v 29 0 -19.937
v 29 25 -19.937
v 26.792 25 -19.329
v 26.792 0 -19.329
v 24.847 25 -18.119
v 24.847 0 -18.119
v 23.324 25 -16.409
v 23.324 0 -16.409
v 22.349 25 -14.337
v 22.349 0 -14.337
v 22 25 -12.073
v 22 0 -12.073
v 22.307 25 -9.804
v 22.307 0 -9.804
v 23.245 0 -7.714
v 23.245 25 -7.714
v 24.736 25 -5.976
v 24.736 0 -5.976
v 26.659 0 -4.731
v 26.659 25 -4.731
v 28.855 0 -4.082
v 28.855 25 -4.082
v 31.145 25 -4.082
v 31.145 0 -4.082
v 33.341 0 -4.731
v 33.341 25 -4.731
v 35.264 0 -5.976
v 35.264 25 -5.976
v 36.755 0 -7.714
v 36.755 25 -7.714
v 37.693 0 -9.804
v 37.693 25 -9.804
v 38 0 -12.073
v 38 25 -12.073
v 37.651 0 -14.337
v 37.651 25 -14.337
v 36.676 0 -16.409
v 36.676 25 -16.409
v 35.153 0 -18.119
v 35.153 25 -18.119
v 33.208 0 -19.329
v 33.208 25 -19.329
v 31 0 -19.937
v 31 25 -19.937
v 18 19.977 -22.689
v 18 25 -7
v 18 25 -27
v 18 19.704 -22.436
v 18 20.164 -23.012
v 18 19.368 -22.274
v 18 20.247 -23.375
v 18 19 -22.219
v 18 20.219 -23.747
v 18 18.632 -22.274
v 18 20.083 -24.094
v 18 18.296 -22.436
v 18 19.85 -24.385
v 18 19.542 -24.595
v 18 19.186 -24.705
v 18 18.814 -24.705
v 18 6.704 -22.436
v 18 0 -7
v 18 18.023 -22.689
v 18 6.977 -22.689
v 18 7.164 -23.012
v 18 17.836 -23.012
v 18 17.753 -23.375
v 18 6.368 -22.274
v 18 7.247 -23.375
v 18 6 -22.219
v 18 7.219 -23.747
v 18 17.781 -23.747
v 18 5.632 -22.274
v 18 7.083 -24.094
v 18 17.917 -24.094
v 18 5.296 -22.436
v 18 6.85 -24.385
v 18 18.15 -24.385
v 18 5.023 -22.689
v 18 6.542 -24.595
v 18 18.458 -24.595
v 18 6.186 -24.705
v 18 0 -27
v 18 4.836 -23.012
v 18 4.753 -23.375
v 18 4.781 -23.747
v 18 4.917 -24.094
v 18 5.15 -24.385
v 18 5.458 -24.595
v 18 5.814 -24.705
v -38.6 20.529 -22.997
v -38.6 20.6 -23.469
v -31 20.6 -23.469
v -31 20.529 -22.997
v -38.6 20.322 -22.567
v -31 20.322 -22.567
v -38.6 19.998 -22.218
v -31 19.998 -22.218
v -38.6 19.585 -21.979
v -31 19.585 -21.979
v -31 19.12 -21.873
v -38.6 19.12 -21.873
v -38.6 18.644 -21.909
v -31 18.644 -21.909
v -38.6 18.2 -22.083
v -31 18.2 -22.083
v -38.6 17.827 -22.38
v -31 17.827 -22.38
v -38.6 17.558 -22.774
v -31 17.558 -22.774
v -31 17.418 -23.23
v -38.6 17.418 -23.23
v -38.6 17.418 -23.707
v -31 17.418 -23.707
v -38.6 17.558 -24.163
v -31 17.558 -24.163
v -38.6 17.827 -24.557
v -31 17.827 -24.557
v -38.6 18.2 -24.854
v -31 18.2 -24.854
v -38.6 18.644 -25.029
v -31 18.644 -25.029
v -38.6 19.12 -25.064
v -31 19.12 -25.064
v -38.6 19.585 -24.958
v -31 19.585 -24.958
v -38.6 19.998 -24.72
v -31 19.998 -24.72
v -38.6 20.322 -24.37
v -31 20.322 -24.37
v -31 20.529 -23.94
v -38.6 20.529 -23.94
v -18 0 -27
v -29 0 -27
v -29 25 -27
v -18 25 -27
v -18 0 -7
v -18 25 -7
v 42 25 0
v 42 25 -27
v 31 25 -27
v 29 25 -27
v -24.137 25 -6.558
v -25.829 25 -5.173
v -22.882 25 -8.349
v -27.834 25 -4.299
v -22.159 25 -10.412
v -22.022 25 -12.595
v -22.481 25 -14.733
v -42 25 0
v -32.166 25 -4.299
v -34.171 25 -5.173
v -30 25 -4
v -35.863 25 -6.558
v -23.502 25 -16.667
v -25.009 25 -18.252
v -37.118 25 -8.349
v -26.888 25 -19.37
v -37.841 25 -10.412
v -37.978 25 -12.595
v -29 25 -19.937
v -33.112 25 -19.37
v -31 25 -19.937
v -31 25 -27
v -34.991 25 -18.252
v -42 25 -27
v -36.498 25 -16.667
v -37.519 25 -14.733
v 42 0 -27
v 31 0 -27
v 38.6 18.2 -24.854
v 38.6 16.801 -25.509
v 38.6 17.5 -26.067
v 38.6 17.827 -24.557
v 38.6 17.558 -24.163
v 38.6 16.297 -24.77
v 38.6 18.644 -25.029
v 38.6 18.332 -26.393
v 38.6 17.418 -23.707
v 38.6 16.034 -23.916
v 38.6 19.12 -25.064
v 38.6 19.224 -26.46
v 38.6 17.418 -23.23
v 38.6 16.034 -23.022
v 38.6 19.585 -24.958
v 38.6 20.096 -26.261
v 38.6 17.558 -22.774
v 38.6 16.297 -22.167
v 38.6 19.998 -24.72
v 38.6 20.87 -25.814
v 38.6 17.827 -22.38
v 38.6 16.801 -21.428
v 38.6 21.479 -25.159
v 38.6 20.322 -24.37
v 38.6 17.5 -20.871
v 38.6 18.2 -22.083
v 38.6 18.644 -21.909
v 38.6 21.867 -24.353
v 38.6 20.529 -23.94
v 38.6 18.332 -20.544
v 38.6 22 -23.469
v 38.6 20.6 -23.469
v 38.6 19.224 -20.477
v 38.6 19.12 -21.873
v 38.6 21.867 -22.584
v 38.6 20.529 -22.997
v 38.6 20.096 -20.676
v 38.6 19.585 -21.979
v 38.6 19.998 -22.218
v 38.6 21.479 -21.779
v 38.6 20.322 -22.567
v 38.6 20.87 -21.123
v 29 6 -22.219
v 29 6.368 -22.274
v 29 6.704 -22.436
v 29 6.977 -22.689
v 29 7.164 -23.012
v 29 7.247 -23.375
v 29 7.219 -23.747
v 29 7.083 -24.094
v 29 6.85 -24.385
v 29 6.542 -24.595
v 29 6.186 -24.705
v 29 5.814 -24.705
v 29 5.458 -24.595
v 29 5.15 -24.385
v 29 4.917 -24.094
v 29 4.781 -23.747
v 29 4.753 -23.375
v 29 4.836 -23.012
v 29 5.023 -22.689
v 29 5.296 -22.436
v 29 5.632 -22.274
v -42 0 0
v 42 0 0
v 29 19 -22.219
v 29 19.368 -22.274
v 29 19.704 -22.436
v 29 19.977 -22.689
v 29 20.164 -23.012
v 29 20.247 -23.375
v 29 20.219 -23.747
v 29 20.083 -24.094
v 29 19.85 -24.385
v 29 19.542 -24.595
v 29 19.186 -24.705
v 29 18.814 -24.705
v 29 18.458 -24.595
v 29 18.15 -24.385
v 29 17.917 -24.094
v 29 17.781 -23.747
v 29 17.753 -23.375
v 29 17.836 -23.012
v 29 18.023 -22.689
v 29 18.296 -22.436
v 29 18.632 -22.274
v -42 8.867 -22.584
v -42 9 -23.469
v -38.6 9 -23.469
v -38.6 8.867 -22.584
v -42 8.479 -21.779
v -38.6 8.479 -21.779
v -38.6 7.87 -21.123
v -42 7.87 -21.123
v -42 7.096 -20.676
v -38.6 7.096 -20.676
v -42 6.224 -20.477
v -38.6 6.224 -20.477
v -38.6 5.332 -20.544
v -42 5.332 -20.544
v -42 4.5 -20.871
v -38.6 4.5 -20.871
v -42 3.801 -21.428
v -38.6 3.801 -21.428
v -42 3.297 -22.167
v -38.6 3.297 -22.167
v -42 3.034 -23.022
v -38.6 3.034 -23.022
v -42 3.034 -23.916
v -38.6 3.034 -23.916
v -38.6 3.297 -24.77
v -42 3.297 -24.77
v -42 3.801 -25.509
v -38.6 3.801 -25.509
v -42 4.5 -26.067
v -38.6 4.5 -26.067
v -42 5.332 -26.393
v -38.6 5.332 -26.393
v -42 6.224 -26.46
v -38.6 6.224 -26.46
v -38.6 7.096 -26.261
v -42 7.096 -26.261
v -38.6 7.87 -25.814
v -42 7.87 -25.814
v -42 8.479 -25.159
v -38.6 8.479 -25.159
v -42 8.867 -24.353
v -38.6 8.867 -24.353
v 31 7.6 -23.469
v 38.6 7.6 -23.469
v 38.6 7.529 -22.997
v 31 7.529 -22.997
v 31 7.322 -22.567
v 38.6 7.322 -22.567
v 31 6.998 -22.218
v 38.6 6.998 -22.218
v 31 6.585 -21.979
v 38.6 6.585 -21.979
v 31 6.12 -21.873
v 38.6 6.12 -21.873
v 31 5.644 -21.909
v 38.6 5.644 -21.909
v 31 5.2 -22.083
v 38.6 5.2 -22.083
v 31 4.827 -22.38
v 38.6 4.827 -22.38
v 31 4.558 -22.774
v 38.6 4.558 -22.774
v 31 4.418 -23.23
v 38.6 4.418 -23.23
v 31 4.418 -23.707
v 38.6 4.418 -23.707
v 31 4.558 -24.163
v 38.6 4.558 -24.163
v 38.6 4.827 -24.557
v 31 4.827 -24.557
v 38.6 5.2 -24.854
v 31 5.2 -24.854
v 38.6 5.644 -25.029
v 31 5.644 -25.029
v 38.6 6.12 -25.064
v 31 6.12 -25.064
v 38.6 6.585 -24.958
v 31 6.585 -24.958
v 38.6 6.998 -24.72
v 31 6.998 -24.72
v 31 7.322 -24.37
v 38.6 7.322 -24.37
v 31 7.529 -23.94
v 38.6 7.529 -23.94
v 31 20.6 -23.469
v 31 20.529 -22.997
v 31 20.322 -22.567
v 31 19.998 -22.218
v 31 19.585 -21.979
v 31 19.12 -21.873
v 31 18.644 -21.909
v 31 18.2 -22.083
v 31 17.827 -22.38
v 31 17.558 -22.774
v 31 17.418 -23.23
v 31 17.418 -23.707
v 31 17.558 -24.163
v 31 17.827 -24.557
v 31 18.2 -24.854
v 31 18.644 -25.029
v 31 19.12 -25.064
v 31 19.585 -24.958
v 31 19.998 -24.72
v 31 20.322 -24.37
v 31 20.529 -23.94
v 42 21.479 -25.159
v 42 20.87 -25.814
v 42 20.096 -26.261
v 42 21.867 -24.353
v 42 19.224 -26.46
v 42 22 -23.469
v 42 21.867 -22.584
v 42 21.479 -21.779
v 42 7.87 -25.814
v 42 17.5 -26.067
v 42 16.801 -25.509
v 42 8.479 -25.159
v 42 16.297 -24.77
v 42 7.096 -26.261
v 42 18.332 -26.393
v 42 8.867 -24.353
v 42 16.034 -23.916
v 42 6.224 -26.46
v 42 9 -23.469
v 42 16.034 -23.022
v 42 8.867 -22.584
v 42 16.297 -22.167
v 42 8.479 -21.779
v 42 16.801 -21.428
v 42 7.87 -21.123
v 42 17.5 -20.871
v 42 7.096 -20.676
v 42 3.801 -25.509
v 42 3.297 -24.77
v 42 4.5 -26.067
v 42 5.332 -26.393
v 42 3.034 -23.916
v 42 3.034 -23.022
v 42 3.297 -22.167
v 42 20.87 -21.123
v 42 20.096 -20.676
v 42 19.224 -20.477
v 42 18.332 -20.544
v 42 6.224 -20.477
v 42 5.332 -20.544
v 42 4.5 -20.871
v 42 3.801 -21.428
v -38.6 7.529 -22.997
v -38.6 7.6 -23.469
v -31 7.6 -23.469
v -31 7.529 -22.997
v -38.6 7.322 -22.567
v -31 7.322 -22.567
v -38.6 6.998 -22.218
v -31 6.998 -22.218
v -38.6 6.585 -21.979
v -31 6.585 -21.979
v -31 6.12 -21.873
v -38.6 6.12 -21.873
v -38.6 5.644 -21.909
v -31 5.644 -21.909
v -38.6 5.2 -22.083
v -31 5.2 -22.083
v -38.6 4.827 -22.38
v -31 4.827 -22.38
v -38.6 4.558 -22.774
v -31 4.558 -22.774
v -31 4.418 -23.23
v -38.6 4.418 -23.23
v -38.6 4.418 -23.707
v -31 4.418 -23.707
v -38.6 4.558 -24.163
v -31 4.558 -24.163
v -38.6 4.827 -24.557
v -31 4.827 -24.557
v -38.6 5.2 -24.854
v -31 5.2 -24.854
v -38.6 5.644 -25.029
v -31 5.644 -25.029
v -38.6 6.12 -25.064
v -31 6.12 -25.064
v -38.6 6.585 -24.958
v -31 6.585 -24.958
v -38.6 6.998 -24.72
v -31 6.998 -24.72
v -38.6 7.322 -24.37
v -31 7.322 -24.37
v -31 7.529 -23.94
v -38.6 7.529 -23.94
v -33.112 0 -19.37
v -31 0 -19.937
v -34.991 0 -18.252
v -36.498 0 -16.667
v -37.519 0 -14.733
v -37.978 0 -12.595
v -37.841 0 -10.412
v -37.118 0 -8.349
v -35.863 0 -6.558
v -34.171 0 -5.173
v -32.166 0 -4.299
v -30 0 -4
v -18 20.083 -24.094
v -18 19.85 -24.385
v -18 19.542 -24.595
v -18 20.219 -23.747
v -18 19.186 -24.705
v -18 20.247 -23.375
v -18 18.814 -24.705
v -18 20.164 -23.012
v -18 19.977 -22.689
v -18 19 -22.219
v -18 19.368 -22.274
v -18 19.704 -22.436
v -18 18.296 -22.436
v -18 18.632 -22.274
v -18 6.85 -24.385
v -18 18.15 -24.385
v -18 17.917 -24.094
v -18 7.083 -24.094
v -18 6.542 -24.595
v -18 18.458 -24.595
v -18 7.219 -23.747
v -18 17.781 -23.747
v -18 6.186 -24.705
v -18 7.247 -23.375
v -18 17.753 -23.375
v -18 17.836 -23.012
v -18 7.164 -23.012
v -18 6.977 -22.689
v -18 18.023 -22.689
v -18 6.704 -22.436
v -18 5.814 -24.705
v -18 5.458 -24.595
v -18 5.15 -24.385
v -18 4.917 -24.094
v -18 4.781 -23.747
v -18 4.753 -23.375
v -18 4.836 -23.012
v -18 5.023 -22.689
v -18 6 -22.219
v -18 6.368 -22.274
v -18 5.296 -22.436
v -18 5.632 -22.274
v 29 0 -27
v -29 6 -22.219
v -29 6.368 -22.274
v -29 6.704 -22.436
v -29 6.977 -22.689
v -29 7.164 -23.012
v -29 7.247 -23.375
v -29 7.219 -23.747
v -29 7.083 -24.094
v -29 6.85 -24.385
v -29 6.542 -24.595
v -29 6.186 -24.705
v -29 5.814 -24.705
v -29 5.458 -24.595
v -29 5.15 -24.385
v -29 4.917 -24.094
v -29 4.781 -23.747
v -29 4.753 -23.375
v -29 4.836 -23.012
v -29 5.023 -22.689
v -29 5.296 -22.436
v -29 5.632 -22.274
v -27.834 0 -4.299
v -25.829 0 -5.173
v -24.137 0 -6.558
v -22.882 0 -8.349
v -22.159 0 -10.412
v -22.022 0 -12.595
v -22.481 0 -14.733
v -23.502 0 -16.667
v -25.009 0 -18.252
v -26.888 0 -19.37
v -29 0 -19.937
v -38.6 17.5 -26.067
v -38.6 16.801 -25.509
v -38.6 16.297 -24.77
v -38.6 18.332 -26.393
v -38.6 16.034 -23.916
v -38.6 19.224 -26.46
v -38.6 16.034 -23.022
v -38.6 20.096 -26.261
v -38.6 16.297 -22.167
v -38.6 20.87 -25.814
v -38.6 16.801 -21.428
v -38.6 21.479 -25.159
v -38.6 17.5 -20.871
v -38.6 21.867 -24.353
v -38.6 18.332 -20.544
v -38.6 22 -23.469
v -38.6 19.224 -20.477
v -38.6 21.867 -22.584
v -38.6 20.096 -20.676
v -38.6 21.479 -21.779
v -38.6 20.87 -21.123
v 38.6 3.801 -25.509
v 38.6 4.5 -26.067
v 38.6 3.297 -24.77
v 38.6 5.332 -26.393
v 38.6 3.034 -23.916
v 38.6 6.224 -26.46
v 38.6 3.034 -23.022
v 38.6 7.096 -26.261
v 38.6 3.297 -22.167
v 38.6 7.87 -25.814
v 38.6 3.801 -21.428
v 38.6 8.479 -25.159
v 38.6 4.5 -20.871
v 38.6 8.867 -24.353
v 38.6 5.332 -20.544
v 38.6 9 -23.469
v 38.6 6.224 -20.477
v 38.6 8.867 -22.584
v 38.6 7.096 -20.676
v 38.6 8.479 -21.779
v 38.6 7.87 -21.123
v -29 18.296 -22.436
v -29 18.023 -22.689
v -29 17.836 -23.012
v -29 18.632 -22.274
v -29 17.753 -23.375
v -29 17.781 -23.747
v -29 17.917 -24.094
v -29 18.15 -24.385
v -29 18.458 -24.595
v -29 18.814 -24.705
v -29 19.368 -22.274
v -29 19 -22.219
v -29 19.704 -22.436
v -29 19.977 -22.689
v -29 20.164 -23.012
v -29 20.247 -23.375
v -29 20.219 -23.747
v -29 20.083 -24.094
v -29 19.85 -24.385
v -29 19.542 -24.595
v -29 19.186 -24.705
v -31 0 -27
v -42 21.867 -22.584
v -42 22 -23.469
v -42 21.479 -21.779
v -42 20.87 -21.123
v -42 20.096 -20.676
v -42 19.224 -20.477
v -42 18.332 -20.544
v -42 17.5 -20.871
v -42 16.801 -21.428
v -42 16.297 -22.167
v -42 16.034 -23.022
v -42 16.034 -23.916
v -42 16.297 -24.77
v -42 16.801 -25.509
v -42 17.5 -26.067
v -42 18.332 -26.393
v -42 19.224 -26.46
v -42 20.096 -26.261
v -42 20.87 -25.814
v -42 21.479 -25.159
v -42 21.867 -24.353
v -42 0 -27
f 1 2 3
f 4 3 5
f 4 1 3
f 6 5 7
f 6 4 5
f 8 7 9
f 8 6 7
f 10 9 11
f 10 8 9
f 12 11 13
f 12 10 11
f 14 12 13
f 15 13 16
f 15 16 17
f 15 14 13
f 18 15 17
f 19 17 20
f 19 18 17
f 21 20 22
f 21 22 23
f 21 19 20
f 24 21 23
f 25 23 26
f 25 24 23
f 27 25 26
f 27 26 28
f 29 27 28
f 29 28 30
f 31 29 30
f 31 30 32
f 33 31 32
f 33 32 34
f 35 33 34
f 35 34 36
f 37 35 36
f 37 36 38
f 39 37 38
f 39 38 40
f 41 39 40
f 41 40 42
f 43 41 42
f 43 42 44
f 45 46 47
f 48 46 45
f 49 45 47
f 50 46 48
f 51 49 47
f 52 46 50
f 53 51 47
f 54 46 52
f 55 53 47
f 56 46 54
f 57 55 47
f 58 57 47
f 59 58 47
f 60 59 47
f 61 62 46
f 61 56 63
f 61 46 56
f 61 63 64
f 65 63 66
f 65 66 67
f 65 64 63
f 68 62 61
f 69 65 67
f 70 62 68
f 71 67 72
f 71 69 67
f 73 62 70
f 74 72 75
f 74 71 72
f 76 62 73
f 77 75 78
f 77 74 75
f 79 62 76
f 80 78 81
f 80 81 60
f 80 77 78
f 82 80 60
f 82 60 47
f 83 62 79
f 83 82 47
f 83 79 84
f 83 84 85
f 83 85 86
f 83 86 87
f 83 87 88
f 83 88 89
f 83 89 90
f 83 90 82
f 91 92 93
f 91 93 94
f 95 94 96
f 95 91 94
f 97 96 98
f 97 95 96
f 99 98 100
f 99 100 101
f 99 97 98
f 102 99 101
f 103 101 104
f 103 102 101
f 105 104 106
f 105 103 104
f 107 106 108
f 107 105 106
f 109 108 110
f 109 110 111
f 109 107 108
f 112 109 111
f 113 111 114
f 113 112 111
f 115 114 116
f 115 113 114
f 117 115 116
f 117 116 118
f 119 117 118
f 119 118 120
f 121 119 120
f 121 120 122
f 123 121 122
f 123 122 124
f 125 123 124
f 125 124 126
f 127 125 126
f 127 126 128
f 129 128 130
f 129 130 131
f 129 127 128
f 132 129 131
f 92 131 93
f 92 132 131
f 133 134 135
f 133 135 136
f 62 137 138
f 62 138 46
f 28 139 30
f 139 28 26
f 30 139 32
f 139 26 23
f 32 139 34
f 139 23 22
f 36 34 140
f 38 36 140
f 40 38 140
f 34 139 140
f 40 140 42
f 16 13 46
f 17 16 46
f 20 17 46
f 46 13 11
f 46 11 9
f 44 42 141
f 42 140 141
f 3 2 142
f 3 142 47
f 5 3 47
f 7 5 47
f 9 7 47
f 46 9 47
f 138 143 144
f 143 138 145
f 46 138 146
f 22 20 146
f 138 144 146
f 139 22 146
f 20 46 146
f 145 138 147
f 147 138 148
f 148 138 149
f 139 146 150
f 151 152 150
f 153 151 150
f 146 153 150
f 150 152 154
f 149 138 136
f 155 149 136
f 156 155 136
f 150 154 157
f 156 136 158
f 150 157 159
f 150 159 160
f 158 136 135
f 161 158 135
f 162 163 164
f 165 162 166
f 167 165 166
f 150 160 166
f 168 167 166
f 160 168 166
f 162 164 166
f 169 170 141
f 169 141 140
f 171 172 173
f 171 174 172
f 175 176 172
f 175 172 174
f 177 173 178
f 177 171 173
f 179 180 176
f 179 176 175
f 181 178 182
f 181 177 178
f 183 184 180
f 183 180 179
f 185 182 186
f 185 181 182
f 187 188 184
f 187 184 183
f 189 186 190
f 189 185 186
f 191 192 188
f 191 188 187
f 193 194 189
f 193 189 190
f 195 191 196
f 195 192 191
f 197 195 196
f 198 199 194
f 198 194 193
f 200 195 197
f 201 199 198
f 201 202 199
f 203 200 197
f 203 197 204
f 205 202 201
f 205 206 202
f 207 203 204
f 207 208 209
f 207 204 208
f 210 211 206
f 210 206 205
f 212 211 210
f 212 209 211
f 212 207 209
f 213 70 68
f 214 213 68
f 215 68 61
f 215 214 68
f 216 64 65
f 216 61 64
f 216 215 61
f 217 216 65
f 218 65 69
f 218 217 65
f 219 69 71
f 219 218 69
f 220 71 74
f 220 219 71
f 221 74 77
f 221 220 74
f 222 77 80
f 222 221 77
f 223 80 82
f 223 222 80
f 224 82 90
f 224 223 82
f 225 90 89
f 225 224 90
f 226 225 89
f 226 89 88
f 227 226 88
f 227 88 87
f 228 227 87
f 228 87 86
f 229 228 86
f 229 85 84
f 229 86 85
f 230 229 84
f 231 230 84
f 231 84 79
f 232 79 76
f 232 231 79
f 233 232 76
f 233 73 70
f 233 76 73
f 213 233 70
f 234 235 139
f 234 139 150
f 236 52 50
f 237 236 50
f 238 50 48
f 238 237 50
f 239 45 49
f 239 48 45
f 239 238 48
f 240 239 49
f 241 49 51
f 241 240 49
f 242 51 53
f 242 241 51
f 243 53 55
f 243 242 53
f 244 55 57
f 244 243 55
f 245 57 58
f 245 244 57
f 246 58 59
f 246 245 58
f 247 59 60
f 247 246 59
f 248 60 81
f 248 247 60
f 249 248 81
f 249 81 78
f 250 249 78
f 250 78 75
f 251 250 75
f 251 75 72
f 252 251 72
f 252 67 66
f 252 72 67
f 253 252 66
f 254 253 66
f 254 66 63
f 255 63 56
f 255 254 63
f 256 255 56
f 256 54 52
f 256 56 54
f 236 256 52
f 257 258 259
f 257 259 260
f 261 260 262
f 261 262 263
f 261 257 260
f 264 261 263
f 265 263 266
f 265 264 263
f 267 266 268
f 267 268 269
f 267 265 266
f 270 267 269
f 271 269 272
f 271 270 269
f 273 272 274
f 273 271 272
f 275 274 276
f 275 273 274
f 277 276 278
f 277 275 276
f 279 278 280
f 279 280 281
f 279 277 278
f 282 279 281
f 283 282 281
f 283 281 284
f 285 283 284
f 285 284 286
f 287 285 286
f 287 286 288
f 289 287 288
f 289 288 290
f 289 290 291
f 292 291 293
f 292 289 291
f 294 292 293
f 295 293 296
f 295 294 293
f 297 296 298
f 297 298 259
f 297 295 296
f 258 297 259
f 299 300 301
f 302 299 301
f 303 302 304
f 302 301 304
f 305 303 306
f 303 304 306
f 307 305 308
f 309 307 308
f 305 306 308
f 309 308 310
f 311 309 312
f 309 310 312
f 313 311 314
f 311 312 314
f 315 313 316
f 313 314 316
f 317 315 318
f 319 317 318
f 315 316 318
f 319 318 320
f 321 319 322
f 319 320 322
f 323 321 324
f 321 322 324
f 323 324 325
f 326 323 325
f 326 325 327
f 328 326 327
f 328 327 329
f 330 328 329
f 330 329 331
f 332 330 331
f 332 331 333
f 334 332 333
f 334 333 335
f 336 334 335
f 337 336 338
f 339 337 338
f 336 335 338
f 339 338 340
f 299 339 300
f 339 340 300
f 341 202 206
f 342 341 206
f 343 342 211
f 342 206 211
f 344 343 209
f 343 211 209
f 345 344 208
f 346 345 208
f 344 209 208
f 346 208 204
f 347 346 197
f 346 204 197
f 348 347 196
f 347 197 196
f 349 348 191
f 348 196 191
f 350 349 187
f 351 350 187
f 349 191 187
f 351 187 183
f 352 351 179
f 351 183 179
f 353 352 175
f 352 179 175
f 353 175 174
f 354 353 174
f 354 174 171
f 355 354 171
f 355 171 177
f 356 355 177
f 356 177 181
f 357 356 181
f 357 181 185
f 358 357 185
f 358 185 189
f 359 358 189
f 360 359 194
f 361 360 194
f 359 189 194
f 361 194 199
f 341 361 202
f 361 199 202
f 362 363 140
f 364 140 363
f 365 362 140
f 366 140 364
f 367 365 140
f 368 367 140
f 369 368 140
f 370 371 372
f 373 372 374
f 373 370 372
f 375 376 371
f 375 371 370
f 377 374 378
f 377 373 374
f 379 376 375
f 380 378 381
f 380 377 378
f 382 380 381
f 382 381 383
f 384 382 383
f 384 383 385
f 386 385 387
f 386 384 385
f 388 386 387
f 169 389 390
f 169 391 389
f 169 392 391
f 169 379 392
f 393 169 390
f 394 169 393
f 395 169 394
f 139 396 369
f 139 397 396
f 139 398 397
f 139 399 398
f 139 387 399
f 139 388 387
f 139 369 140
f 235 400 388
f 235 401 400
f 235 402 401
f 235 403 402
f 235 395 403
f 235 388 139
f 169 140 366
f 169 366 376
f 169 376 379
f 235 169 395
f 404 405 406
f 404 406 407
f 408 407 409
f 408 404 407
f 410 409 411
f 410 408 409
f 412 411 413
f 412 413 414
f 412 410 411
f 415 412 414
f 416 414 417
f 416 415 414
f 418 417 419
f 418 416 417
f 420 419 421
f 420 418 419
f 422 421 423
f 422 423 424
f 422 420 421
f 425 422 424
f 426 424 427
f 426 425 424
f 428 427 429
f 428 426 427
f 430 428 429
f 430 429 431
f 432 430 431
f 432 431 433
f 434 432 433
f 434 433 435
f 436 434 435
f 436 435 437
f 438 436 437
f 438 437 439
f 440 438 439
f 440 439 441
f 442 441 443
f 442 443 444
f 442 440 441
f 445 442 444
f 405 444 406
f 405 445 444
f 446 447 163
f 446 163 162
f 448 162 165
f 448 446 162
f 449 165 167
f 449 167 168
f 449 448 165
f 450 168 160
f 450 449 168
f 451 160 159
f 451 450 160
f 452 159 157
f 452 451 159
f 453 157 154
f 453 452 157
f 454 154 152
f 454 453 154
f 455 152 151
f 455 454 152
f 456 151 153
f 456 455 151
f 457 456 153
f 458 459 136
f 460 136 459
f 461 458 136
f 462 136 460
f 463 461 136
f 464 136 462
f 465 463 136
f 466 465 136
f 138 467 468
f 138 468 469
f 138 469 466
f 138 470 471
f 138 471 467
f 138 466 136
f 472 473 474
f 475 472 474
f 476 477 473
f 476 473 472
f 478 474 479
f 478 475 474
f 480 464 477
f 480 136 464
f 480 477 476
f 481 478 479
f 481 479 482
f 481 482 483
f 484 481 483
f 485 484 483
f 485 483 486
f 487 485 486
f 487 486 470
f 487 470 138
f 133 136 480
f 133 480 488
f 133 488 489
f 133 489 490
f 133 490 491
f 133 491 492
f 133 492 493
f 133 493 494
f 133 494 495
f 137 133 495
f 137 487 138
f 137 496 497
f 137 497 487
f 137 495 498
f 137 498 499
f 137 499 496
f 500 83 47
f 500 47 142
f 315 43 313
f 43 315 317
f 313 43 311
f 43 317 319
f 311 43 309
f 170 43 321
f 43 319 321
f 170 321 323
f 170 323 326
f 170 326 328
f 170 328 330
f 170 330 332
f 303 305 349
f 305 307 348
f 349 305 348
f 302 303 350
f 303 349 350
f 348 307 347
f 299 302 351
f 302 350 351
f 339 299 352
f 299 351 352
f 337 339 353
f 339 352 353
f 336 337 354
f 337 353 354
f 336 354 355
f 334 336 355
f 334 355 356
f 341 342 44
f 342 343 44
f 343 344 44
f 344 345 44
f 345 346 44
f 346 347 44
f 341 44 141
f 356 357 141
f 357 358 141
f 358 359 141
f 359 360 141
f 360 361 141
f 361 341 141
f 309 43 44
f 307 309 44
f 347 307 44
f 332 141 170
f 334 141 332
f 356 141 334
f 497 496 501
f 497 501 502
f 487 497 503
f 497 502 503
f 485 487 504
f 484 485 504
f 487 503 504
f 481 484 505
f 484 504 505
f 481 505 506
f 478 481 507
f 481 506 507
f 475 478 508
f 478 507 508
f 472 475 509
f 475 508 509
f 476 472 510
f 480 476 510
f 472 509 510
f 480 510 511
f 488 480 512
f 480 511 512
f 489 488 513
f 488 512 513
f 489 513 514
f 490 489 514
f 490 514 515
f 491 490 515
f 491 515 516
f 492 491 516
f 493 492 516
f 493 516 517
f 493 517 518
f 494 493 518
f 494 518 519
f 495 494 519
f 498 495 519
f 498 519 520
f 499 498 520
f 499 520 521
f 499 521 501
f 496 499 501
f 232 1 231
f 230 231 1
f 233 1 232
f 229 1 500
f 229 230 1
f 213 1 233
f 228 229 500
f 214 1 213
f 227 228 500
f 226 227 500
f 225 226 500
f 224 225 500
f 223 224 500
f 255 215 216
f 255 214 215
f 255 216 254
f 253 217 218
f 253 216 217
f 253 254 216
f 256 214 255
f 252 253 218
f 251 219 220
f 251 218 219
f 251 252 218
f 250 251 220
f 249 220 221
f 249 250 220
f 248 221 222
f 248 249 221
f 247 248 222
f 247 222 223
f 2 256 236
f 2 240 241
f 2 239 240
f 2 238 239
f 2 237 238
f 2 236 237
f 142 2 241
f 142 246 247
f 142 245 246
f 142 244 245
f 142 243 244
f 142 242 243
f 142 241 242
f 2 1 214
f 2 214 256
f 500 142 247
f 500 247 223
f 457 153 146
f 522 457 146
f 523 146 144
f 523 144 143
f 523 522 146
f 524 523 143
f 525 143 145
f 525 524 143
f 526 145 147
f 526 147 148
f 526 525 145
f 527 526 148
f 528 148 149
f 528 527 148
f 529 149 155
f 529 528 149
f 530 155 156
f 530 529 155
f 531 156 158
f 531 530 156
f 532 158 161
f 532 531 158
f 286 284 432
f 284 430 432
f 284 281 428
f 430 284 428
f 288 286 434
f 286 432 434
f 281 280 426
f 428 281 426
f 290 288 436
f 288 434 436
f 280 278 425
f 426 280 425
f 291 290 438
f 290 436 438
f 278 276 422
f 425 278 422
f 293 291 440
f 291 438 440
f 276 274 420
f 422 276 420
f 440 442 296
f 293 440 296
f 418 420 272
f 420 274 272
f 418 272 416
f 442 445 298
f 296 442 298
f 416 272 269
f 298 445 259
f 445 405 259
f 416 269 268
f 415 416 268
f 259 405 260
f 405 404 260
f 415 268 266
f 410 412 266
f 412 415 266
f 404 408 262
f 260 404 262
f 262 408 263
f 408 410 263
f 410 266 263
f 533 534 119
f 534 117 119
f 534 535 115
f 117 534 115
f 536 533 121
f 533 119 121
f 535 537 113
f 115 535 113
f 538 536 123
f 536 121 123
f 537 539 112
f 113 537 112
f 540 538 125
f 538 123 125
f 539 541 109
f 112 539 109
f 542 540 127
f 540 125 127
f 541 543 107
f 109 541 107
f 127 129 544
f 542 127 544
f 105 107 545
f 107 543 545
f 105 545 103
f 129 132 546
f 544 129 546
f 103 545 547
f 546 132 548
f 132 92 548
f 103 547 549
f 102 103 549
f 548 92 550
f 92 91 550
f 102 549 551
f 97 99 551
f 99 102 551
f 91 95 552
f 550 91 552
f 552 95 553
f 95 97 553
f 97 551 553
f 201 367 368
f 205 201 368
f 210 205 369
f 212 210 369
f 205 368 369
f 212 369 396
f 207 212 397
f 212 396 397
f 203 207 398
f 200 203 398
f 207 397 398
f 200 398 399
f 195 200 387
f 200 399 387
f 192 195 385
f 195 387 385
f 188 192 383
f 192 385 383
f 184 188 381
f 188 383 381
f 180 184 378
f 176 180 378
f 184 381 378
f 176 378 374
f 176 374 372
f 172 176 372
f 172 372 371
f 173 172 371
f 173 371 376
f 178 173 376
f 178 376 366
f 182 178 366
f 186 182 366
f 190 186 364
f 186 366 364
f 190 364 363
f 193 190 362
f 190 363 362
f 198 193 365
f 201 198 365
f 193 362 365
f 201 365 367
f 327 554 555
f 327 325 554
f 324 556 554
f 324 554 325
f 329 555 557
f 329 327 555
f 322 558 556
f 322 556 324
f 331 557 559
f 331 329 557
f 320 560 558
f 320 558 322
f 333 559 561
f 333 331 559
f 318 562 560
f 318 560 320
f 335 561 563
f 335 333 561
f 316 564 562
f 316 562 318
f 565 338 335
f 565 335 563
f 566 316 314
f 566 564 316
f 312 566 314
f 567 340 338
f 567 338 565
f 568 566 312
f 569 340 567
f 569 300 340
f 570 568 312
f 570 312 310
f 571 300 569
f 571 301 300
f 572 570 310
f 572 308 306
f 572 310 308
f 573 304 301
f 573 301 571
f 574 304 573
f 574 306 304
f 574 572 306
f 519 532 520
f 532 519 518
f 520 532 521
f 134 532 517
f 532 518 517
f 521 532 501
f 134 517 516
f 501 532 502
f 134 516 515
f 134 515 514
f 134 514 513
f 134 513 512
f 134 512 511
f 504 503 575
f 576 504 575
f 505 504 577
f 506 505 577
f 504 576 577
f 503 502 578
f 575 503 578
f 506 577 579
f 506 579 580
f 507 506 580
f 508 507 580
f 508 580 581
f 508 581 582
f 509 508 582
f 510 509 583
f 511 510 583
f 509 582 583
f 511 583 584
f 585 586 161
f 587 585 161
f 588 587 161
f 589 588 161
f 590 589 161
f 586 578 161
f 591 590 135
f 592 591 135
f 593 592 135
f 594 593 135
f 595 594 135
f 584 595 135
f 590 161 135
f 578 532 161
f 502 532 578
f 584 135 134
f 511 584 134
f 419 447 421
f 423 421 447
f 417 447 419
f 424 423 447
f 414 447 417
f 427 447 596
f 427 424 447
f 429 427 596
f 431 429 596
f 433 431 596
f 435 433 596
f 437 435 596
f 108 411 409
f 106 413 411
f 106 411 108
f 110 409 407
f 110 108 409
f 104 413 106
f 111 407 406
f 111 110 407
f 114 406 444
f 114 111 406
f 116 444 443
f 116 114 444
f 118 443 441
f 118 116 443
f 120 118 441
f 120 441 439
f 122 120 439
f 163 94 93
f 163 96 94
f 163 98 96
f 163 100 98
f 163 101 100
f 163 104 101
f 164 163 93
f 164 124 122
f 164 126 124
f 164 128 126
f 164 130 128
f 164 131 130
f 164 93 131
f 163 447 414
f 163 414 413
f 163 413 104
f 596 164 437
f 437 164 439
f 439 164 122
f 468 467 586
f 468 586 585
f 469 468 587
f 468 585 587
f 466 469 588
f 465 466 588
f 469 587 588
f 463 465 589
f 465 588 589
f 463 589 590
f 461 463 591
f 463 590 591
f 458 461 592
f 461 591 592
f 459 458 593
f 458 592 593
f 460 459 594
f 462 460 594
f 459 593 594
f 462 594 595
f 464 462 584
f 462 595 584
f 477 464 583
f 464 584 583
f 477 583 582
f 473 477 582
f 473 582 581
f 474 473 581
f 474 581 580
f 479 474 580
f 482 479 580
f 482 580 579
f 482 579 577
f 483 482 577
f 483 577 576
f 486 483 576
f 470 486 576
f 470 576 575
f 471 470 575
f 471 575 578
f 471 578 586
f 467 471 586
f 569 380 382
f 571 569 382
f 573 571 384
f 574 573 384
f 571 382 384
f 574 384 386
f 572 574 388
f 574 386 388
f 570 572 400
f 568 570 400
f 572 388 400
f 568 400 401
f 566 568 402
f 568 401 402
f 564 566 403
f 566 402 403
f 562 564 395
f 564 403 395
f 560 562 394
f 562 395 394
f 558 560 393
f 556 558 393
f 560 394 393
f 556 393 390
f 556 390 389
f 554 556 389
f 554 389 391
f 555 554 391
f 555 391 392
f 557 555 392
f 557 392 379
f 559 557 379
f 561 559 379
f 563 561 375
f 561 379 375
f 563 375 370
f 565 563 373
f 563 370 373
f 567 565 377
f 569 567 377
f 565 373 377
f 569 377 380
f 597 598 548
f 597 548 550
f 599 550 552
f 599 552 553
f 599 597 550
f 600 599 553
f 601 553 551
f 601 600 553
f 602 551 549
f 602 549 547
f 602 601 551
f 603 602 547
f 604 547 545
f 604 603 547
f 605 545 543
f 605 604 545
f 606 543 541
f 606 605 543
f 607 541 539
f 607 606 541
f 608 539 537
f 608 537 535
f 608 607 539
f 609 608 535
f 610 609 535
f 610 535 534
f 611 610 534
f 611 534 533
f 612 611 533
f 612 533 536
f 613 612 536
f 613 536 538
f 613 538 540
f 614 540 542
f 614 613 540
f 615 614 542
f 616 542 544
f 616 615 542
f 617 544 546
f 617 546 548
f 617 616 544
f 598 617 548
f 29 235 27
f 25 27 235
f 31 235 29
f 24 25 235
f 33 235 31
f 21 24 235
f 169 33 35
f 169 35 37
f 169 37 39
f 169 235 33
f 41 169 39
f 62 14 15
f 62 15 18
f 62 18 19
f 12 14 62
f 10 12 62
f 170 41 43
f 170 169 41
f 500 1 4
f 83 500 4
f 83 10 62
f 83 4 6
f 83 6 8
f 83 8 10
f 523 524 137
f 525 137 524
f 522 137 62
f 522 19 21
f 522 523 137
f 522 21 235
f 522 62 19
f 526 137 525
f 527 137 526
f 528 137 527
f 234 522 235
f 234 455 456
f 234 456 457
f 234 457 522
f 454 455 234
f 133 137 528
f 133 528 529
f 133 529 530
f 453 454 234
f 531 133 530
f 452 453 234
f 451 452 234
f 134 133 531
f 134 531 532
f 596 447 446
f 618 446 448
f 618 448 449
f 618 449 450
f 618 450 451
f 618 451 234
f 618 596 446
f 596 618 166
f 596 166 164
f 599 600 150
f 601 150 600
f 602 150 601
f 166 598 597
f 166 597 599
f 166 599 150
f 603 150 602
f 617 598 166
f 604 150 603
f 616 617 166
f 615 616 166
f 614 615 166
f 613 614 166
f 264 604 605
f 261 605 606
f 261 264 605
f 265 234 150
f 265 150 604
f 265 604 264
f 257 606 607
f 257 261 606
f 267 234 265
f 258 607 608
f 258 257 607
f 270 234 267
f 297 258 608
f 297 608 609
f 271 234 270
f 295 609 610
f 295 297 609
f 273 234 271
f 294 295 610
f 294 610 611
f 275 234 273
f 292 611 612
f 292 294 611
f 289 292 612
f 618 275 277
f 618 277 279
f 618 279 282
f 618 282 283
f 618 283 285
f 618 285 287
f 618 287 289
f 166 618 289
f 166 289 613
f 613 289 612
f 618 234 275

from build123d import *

# Parameters (mm, degrees)
SKETCH_1_R                = 8
EXTRUDE_1_DEPTH           = 25
SKETCH_2_W                = 2
SKETCH_2_H                = 7.062746067
CUT_EXTRUDE_1_DEPTH       = 56.839054433
HOLE_START                = -42
HOLE_WIZARD_1_OUTLINE_R   = 3
HOLE_WIZARD_1_DEPTH       = 3.4
HOLE_START_2              = -38.6
HOLE_WIZARD_1_2_OUTLINE_R = 1.6
HOLE_WIZARD_1_2_DEPTH     = 7.6
HOLE_WIZARD_M3_1_D        = 2.5
HOLE_WIZARD_M3_1_DEPTH    = 11.001


# Read off the part's stored shape, not the designer's step: 打孔尺寸(%根据)内六角圆柱头螺钉的类型1
with BuildPart() as part:
    # 草图1 → 凸台-拉伸1 (new body)
    with BuildSketch(Plane(origin=(0, 0, 0), x_dir=(1, 0, 0), z_dir=(0, 1, 0))):
        Polygon((-18, 27), (-18, 7), (18, 7), (18, 27), (42, 27), (42, 0), (-42, 0), (-42, 27), align=None)
        with Locations(Location((-30, 12, 0), (0, 0, 270))):
            Circle(SKETCH_1_R, mode=Mode.SUBTRACT)
        with Locations(Location((30, 12, 0), (0, 0, 90))):
            Circle(SKETCH_1_R, mode=Mode.SUBTRACT)
    extrude(amount=EXTRUDE_1_DEPTH)

    # 草图2 → 切除-拉伸1 (cut, through all)
    with BuildSketch(Plane(origin=(0, 25, 0), x_dir=(1, 0, 0), z_dir=(0, 1, 0))):
        with Locations((-30, 23.468626967)):
            Rectangle(SKETCH_2_W, SKETCH_2_H)
    cut_extrude_1 = extrude(amount=-CUT_EXTRUDE_1_DEPTH, mode=Mode.SUBTRACT)

    # 打孔尺寸(%根据)内六角圆柱头螺钉的类型1 outline → 打孔尺寸(%根据)内六角圆柱头螺钉的类型1 (cut)
    with BuildSketch(Plane.YZ.offset(HOLE_START)):
        with Locations((6, -23.468626967)):
            Circle(HOLE_WIZARD_1_OUTLINE_R)
        with Locations((19, -23.468626967)):
            Circle(HOLE_WIZARD_1_OUTLINE_R)
    hole_wizard_1 = extrude(amount=HOLE_WIZARD_1_DEPTH, mode=Mode.SUBTRACT)

    # Hole Wizard 1 2 outline → Hole Wizard 1 2 (cut)
    with BuildSketch(Plane.YZ.offset(HOLE_START_2)):
        with Locations((6, -23.468626967)):
            Circle(HOLE_WIZARD_1_2_OUTLINE_R)
        with Locations((19, -23.468626967)):
            Circle(HOLE_WIZARD_1_2_OUTLINE_R)
    hole_wizard_1_2 = extrude(amount=HOLE_WIZARD_1_2_DEPTH, mode=Mode.SUBTRACT)

    # M3 螺纹孔1
    with Locations(Plane(origin=(-18, 0, 0), x_dir=(0, 0, -1), z_dir=(1, 0, 0))):
        with Locations((23.468626967, 19), (23.468626967, 6)):
            hole_wizard_m3_1 = Hole(HOLE_WIZARD_M3_1_D / 2, depth=HOLE_WIZARD_M3_1_DEPTH)

    # 镜向1: 切除-拉伸1, 打孔尺寸(%根据)内六角圆柱头螺钉的类型1, Hole Wizard 1 2, M3 螺纹孔1 across plane
    add(cut_extrude_1.mirror(Plane(origin=(0, 0, 0), x_dir=(0, 0, 1), z_dir=(1, 0, 0))), mode=Mode.SUBTRACT)
    add(hole_wizard_1.mirror(Plane(origin=(0, 0, 0), x_dir=(0, 0, 1), z_dir=(1, 0, 0))), mode=Mode.SUBTRACT)
    add(hole_wizard_1_2.mirror(Plane(origin=(0, 0, 0), x_dir=(0, 0, 1), z_dir=(1, 0, 0))), mode=Mode.SUBTRACT)
    add(hole_wizard_m3_1.mirror(Plane(origin=(0, 0, 0), x_dir=(0, 0, 1), z_dir=(1, 0, 0))), mode=Mode.SUBTRACT)


solid = part.part
